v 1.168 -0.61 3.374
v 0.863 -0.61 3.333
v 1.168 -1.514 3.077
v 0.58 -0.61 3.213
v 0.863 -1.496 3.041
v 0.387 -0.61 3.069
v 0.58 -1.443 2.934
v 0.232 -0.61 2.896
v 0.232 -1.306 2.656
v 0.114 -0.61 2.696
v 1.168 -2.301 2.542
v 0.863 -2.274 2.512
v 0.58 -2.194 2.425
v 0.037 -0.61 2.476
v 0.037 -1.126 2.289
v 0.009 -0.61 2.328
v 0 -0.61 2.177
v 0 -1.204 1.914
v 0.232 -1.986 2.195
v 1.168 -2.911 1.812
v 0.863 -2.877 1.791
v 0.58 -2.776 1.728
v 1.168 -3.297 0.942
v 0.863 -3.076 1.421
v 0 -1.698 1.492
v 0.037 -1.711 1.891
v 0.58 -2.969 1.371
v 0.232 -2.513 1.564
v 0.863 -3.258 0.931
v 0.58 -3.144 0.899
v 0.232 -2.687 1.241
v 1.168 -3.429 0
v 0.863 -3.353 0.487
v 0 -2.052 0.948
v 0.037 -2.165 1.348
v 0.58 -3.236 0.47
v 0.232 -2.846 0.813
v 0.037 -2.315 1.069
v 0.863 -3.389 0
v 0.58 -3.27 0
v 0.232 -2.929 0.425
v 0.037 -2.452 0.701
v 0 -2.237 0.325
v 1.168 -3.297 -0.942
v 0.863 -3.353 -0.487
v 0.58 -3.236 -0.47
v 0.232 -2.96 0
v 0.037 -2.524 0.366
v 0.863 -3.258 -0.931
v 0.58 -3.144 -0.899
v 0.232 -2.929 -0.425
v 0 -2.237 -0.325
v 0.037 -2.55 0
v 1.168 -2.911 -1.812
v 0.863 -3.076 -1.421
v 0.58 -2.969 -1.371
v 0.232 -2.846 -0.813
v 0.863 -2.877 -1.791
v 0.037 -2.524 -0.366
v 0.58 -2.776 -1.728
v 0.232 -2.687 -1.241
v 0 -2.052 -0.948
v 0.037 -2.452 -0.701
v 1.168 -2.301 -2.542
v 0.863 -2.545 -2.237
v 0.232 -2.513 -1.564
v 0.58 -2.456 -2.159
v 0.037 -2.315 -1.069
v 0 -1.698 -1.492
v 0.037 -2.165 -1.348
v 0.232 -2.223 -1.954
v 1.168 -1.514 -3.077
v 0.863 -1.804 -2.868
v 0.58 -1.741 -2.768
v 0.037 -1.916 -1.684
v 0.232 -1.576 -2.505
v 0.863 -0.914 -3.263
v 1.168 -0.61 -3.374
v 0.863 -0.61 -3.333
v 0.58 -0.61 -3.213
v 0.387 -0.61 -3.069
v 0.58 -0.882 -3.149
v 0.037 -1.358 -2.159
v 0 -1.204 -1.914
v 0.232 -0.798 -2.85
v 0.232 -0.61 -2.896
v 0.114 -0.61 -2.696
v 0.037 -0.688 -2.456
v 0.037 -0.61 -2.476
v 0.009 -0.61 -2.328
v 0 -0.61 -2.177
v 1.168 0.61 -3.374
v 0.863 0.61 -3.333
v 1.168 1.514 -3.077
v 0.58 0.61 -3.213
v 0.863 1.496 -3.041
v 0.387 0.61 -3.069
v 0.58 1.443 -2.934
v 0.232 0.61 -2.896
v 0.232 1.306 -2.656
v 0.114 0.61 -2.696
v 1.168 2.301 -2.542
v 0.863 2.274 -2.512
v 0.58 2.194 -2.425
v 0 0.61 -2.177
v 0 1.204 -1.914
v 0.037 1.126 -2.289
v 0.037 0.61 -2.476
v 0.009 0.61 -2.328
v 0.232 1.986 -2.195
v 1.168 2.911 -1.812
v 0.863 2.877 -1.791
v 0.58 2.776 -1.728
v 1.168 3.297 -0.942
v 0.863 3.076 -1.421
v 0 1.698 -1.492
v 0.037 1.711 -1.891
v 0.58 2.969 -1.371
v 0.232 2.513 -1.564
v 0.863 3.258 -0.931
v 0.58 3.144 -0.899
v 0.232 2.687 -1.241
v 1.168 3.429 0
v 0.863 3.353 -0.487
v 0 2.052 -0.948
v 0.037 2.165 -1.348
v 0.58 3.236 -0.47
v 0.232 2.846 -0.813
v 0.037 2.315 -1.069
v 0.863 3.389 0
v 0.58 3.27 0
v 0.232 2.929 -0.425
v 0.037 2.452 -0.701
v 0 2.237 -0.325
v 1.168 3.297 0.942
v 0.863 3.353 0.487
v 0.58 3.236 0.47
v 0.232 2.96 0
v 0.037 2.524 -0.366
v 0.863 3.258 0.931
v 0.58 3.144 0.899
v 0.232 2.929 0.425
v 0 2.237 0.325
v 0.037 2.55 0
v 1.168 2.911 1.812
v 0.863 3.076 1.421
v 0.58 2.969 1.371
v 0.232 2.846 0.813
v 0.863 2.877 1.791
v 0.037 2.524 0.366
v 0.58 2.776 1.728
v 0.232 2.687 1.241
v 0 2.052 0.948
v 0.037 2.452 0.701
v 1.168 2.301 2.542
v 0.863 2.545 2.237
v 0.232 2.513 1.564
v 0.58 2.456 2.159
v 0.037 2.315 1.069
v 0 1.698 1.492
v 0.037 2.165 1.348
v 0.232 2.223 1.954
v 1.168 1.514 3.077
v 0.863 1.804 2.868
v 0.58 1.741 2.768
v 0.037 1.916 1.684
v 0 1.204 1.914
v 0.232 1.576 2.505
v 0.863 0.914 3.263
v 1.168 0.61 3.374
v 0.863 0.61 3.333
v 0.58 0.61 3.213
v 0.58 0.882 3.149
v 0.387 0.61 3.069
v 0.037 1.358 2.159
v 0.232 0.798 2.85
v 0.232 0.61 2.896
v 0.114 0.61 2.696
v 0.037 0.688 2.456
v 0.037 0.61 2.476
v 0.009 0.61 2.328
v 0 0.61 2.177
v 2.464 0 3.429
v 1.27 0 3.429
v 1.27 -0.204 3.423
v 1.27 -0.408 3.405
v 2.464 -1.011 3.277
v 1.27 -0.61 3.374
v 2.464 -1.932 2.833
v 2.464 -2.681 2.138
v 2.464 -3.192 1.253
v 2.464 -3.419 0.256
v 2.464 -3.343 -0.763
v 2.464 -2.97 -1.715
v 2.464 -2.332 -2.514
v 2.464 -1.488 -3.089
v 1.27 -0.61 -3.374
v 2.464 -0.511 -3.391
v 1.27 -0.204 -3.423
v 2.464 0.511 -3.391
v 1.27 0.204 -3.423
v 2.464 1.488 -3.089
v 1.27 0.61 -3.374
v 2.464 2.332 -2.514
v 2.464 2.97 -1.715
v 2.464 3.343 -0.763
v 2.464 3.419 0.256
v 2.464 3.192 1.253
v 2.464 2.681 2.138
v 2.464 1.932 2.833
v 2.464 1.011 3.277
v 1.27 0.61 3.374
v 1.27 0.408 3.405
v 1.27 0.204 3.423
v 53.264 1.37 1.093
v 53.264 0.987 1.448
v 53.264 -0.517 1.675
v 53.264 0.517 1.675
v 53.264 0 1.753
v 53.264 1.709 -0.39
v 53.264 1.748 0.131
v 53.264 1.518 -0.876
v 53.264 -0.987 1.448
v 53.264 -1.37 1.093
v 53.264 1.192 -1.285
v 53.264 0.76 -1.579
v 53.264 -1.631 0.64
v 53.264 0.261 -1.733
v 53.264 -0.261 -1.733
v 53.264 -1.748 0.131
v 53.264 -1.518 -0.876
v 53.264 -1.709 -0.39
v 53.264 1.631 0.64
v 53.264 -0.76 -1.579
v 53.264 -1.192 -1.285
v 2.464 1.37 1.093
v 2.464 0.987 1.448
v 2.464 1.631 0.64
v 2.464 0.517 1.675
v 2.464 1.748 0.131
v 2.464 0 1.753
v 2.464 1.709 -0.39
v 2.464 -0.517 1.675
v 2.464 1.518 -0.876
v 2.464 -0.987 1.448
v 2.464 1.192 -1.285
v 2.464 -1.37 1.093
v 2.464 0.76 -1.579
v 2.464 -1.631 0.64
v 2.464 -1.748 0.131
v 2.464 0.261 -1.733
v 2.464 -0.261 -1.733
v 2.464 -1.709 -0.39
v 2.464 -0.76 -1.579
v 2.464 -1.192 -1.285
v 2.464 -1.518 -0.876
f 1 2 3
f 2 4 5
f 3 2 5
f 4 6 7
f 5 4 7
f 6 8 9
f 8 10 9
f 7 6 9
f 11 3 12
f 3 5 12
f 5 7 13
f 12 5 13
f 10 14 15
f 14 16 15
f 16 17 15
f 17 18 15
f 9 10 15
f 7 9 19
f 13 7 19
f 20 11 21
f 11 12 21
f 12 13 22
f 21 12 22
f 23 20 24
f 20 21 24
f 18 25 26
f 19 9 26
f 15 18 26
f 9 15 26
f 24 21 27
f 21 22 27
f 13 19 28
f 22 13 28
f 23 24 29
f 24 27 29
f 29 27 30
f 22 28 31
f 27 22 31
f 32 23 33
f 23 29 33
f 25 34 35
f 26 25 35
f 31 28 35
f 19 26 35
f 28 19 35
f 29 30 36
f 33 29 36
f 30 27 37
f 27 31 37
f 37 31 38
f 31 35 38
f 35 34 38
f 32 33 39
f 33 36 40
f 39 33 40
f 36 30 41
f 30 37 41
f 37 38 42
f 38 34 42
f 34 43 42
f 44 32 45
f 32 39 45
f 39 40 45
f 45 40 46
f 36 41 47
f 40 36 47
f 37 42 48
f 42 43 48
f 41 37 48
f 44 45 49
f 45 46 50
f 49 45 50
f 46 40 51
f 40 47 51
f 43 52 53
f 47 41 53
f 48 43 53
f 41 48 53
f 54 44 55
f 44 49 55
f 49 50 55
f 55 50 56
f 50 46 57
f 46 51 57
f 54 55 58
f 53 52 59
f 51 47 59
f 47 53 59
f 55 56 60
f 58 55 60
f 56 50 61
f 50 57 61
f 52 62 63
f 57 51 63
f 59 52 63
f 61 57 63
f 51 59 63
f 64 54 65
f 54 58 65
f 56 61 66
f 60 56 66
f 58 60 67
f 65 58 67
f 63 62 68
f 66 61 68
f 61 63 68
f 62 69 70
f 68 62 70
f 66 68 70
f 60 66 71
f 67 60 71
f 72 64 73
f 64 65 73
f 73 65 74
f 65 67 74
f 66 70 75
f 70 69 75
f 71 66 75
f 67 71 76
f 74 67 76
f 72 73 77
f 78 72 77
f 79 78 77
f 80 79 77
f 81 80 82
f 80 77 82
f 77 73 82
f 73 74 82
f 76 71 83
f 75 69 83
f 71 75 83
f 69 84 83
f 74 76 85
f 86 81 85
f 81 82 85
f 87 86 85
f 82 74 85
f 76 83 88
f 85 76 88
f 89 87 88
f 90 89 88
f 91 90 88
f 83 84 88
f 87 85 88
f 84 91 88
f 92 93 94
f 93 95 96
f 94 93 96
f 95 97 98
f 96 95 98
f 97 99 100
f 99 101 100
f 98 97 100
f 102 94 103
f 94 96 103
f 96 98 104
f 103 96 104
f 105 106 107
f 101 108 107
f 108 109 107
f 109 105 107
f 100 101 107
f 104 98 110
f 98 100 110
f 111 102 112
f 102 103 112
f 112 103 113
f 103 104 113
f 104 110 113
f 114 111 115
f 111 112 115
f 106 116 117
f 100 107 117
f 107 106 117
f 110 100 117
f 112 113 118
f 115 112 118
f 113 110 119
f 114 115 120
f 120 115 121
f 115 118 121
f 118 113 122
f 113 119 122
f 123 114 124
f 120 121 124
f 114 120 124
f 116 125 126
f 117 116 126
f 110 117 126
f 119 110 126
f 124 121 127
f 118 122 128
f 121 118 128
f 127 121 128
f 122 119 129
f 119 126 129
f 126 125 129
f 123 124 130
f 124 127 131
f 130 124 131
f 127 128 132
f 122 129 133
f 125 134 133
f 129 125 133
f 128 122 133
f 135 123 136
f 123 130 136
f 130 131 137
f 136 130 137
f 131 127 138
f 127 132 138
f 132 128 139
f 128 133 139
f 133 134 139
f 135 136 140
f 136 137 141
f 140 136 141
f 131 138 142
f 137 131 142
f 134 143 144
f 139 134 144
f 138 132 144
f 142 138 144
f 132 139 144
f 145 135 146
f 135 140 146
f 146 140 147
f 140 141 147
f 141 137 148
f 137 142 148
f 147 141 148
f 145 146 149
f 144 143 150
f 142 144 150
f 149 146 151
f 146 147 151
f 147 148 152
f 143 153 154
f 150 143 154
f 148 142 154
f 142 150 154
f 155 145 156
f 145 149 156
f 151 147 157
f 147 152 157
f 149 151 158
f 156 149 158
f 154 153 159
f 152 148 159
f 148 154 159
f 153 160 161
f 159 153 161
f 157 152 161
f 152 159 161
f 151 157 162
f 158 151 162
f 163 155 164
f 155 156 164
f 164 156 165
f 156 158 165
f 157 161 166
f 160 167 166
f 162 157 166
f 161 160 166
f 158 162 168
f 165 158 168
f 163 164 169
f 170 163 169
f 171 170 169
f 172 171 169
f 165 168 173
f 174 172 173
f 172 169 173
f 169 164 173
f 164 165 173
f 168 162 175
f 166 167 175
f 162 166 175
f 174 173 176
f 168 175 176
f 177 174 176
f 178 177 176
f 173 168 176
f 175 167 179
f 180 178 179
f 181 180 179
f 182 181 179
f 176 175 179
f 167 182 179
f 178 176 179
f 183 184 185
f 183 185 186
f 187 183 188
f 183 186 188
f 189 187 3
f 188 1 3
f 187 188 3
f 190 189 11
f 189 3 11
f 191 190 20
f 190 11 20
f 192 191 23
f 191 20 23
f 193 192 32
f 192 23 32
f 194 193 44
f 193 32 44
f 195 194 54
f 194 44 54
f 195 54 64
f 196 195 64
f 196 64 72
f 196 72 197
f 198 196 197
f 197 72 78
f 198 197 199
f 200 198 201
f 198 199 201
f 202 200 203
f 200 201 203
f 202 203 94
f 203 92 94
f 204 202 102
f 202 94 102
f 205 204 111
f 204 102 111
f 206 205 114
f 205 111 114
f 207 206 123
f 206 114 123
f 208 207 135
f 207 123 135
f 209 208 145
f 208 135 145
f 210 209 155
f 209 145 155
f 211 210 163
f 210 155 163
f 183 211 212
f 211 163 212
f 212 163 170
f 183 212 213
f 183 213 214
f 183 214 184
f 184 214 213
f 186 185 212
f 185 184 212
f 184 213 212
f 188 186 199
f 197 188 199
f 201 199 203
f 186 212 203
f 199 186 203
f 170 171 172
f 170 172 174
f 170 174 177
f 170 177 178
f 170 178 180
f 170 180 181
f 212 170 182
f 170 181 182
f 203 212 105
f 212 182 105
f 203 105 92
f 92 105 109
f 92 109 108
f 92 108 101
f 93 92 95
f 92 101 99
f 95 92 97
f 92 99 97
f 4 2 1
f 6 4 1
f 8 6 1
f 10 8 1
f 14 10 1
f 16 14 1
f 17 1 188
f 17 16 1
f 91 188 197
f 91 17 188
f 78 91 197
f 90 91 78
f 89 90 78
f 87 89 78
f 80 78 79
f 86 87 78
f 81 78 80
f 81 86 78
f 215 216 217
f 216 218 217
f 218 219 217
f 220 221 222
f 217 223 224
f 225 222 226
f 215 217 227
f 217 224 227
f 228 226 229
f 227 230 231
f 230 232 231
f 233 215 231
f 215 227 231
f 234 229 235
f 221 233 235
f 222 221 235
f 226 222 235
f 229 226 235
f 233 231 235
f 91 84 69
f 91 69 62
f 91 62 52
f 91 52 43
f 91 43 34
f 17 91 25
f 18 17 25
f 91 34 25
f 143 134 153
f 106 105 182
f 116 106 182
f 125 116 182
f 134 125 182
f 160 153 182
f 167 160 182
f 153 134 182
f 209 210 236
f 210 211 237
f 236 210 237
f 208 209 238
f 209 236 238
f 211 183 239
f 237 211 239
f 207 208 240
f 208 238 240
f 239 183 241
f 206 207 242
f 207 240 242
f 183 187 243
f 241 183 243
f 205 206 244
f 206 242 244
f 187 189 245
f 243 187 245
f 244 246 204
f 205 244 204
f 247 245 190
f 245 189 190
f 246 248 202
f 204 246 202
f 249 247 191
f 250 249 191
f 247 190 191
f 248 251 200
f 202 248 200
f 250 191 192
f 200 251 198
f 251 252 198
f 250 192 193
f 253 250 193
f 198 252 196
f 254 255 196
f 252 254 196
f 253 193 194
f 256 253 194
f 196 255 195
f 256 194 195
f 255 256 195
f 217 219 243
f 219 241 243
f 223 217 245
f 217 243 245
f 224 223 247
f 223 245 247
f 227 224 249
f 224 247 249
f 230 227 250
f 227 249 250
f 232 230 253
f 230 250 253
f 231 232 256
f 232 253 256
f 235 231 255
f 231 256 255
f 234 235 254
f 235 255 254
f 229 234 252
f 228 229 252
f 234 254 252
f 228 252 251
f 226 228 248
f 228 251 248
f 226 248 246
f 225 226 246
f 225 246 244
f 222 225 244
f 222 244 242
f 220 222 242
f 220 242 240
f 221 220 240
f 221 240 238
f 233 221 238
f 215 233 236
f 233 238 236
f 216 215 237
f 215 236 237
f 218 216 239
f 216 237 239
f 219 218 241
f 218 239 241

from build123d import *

# Parameters (mm, degrees)
SKETCH2_W  = 6.858
SKETCH2_H  = 1.2192
SLOT_DEPTH = 1.27


with BuildPart() as part:
    # BodySke → Base-Revolve (revolve)
    with BuildSketch(Plane.XY, mode=Mode.PRIVATE) as base_revolve_sk:
        with BuildLine():
            Line((2.4638, 1.7526), (2.4638, 3.429))
            Line((2.4638, 3.429), (1.1684, 3.429))
            ThreePointArc((1.1684, 3.429), (0.342216437, 3.086783563), (0, 2.2606))
            Line((0, 2.2606), (0, 0))
            Line((0, 0), (53.2638, 0))
            Line((53.2638, 0), (53.2638, 1.7526))
            Line((53.2638, 1.7526), (2.4638, 1.7526))
        make_face()
    revolve(base_revolve_sk.sketch.rotate(Axis((-25.4, 0, 0), (1, 0, 0)), 90), axis=Axis((-25.4, 0, 0), (1, 0, 0)))

    # Sketch2 → Slot (cut)
    with BuildSketch(Plane(origin=(0, 0, 0), x_dir=(0, 0, -1), z_dir=(1, 0, 0))):
        Rectangle(SKETCH2_W, SKETCH2_H)
    extrude(amount=SLOT_DEPTH, mode=Mode.SUBTRACT)


solid = part.part
